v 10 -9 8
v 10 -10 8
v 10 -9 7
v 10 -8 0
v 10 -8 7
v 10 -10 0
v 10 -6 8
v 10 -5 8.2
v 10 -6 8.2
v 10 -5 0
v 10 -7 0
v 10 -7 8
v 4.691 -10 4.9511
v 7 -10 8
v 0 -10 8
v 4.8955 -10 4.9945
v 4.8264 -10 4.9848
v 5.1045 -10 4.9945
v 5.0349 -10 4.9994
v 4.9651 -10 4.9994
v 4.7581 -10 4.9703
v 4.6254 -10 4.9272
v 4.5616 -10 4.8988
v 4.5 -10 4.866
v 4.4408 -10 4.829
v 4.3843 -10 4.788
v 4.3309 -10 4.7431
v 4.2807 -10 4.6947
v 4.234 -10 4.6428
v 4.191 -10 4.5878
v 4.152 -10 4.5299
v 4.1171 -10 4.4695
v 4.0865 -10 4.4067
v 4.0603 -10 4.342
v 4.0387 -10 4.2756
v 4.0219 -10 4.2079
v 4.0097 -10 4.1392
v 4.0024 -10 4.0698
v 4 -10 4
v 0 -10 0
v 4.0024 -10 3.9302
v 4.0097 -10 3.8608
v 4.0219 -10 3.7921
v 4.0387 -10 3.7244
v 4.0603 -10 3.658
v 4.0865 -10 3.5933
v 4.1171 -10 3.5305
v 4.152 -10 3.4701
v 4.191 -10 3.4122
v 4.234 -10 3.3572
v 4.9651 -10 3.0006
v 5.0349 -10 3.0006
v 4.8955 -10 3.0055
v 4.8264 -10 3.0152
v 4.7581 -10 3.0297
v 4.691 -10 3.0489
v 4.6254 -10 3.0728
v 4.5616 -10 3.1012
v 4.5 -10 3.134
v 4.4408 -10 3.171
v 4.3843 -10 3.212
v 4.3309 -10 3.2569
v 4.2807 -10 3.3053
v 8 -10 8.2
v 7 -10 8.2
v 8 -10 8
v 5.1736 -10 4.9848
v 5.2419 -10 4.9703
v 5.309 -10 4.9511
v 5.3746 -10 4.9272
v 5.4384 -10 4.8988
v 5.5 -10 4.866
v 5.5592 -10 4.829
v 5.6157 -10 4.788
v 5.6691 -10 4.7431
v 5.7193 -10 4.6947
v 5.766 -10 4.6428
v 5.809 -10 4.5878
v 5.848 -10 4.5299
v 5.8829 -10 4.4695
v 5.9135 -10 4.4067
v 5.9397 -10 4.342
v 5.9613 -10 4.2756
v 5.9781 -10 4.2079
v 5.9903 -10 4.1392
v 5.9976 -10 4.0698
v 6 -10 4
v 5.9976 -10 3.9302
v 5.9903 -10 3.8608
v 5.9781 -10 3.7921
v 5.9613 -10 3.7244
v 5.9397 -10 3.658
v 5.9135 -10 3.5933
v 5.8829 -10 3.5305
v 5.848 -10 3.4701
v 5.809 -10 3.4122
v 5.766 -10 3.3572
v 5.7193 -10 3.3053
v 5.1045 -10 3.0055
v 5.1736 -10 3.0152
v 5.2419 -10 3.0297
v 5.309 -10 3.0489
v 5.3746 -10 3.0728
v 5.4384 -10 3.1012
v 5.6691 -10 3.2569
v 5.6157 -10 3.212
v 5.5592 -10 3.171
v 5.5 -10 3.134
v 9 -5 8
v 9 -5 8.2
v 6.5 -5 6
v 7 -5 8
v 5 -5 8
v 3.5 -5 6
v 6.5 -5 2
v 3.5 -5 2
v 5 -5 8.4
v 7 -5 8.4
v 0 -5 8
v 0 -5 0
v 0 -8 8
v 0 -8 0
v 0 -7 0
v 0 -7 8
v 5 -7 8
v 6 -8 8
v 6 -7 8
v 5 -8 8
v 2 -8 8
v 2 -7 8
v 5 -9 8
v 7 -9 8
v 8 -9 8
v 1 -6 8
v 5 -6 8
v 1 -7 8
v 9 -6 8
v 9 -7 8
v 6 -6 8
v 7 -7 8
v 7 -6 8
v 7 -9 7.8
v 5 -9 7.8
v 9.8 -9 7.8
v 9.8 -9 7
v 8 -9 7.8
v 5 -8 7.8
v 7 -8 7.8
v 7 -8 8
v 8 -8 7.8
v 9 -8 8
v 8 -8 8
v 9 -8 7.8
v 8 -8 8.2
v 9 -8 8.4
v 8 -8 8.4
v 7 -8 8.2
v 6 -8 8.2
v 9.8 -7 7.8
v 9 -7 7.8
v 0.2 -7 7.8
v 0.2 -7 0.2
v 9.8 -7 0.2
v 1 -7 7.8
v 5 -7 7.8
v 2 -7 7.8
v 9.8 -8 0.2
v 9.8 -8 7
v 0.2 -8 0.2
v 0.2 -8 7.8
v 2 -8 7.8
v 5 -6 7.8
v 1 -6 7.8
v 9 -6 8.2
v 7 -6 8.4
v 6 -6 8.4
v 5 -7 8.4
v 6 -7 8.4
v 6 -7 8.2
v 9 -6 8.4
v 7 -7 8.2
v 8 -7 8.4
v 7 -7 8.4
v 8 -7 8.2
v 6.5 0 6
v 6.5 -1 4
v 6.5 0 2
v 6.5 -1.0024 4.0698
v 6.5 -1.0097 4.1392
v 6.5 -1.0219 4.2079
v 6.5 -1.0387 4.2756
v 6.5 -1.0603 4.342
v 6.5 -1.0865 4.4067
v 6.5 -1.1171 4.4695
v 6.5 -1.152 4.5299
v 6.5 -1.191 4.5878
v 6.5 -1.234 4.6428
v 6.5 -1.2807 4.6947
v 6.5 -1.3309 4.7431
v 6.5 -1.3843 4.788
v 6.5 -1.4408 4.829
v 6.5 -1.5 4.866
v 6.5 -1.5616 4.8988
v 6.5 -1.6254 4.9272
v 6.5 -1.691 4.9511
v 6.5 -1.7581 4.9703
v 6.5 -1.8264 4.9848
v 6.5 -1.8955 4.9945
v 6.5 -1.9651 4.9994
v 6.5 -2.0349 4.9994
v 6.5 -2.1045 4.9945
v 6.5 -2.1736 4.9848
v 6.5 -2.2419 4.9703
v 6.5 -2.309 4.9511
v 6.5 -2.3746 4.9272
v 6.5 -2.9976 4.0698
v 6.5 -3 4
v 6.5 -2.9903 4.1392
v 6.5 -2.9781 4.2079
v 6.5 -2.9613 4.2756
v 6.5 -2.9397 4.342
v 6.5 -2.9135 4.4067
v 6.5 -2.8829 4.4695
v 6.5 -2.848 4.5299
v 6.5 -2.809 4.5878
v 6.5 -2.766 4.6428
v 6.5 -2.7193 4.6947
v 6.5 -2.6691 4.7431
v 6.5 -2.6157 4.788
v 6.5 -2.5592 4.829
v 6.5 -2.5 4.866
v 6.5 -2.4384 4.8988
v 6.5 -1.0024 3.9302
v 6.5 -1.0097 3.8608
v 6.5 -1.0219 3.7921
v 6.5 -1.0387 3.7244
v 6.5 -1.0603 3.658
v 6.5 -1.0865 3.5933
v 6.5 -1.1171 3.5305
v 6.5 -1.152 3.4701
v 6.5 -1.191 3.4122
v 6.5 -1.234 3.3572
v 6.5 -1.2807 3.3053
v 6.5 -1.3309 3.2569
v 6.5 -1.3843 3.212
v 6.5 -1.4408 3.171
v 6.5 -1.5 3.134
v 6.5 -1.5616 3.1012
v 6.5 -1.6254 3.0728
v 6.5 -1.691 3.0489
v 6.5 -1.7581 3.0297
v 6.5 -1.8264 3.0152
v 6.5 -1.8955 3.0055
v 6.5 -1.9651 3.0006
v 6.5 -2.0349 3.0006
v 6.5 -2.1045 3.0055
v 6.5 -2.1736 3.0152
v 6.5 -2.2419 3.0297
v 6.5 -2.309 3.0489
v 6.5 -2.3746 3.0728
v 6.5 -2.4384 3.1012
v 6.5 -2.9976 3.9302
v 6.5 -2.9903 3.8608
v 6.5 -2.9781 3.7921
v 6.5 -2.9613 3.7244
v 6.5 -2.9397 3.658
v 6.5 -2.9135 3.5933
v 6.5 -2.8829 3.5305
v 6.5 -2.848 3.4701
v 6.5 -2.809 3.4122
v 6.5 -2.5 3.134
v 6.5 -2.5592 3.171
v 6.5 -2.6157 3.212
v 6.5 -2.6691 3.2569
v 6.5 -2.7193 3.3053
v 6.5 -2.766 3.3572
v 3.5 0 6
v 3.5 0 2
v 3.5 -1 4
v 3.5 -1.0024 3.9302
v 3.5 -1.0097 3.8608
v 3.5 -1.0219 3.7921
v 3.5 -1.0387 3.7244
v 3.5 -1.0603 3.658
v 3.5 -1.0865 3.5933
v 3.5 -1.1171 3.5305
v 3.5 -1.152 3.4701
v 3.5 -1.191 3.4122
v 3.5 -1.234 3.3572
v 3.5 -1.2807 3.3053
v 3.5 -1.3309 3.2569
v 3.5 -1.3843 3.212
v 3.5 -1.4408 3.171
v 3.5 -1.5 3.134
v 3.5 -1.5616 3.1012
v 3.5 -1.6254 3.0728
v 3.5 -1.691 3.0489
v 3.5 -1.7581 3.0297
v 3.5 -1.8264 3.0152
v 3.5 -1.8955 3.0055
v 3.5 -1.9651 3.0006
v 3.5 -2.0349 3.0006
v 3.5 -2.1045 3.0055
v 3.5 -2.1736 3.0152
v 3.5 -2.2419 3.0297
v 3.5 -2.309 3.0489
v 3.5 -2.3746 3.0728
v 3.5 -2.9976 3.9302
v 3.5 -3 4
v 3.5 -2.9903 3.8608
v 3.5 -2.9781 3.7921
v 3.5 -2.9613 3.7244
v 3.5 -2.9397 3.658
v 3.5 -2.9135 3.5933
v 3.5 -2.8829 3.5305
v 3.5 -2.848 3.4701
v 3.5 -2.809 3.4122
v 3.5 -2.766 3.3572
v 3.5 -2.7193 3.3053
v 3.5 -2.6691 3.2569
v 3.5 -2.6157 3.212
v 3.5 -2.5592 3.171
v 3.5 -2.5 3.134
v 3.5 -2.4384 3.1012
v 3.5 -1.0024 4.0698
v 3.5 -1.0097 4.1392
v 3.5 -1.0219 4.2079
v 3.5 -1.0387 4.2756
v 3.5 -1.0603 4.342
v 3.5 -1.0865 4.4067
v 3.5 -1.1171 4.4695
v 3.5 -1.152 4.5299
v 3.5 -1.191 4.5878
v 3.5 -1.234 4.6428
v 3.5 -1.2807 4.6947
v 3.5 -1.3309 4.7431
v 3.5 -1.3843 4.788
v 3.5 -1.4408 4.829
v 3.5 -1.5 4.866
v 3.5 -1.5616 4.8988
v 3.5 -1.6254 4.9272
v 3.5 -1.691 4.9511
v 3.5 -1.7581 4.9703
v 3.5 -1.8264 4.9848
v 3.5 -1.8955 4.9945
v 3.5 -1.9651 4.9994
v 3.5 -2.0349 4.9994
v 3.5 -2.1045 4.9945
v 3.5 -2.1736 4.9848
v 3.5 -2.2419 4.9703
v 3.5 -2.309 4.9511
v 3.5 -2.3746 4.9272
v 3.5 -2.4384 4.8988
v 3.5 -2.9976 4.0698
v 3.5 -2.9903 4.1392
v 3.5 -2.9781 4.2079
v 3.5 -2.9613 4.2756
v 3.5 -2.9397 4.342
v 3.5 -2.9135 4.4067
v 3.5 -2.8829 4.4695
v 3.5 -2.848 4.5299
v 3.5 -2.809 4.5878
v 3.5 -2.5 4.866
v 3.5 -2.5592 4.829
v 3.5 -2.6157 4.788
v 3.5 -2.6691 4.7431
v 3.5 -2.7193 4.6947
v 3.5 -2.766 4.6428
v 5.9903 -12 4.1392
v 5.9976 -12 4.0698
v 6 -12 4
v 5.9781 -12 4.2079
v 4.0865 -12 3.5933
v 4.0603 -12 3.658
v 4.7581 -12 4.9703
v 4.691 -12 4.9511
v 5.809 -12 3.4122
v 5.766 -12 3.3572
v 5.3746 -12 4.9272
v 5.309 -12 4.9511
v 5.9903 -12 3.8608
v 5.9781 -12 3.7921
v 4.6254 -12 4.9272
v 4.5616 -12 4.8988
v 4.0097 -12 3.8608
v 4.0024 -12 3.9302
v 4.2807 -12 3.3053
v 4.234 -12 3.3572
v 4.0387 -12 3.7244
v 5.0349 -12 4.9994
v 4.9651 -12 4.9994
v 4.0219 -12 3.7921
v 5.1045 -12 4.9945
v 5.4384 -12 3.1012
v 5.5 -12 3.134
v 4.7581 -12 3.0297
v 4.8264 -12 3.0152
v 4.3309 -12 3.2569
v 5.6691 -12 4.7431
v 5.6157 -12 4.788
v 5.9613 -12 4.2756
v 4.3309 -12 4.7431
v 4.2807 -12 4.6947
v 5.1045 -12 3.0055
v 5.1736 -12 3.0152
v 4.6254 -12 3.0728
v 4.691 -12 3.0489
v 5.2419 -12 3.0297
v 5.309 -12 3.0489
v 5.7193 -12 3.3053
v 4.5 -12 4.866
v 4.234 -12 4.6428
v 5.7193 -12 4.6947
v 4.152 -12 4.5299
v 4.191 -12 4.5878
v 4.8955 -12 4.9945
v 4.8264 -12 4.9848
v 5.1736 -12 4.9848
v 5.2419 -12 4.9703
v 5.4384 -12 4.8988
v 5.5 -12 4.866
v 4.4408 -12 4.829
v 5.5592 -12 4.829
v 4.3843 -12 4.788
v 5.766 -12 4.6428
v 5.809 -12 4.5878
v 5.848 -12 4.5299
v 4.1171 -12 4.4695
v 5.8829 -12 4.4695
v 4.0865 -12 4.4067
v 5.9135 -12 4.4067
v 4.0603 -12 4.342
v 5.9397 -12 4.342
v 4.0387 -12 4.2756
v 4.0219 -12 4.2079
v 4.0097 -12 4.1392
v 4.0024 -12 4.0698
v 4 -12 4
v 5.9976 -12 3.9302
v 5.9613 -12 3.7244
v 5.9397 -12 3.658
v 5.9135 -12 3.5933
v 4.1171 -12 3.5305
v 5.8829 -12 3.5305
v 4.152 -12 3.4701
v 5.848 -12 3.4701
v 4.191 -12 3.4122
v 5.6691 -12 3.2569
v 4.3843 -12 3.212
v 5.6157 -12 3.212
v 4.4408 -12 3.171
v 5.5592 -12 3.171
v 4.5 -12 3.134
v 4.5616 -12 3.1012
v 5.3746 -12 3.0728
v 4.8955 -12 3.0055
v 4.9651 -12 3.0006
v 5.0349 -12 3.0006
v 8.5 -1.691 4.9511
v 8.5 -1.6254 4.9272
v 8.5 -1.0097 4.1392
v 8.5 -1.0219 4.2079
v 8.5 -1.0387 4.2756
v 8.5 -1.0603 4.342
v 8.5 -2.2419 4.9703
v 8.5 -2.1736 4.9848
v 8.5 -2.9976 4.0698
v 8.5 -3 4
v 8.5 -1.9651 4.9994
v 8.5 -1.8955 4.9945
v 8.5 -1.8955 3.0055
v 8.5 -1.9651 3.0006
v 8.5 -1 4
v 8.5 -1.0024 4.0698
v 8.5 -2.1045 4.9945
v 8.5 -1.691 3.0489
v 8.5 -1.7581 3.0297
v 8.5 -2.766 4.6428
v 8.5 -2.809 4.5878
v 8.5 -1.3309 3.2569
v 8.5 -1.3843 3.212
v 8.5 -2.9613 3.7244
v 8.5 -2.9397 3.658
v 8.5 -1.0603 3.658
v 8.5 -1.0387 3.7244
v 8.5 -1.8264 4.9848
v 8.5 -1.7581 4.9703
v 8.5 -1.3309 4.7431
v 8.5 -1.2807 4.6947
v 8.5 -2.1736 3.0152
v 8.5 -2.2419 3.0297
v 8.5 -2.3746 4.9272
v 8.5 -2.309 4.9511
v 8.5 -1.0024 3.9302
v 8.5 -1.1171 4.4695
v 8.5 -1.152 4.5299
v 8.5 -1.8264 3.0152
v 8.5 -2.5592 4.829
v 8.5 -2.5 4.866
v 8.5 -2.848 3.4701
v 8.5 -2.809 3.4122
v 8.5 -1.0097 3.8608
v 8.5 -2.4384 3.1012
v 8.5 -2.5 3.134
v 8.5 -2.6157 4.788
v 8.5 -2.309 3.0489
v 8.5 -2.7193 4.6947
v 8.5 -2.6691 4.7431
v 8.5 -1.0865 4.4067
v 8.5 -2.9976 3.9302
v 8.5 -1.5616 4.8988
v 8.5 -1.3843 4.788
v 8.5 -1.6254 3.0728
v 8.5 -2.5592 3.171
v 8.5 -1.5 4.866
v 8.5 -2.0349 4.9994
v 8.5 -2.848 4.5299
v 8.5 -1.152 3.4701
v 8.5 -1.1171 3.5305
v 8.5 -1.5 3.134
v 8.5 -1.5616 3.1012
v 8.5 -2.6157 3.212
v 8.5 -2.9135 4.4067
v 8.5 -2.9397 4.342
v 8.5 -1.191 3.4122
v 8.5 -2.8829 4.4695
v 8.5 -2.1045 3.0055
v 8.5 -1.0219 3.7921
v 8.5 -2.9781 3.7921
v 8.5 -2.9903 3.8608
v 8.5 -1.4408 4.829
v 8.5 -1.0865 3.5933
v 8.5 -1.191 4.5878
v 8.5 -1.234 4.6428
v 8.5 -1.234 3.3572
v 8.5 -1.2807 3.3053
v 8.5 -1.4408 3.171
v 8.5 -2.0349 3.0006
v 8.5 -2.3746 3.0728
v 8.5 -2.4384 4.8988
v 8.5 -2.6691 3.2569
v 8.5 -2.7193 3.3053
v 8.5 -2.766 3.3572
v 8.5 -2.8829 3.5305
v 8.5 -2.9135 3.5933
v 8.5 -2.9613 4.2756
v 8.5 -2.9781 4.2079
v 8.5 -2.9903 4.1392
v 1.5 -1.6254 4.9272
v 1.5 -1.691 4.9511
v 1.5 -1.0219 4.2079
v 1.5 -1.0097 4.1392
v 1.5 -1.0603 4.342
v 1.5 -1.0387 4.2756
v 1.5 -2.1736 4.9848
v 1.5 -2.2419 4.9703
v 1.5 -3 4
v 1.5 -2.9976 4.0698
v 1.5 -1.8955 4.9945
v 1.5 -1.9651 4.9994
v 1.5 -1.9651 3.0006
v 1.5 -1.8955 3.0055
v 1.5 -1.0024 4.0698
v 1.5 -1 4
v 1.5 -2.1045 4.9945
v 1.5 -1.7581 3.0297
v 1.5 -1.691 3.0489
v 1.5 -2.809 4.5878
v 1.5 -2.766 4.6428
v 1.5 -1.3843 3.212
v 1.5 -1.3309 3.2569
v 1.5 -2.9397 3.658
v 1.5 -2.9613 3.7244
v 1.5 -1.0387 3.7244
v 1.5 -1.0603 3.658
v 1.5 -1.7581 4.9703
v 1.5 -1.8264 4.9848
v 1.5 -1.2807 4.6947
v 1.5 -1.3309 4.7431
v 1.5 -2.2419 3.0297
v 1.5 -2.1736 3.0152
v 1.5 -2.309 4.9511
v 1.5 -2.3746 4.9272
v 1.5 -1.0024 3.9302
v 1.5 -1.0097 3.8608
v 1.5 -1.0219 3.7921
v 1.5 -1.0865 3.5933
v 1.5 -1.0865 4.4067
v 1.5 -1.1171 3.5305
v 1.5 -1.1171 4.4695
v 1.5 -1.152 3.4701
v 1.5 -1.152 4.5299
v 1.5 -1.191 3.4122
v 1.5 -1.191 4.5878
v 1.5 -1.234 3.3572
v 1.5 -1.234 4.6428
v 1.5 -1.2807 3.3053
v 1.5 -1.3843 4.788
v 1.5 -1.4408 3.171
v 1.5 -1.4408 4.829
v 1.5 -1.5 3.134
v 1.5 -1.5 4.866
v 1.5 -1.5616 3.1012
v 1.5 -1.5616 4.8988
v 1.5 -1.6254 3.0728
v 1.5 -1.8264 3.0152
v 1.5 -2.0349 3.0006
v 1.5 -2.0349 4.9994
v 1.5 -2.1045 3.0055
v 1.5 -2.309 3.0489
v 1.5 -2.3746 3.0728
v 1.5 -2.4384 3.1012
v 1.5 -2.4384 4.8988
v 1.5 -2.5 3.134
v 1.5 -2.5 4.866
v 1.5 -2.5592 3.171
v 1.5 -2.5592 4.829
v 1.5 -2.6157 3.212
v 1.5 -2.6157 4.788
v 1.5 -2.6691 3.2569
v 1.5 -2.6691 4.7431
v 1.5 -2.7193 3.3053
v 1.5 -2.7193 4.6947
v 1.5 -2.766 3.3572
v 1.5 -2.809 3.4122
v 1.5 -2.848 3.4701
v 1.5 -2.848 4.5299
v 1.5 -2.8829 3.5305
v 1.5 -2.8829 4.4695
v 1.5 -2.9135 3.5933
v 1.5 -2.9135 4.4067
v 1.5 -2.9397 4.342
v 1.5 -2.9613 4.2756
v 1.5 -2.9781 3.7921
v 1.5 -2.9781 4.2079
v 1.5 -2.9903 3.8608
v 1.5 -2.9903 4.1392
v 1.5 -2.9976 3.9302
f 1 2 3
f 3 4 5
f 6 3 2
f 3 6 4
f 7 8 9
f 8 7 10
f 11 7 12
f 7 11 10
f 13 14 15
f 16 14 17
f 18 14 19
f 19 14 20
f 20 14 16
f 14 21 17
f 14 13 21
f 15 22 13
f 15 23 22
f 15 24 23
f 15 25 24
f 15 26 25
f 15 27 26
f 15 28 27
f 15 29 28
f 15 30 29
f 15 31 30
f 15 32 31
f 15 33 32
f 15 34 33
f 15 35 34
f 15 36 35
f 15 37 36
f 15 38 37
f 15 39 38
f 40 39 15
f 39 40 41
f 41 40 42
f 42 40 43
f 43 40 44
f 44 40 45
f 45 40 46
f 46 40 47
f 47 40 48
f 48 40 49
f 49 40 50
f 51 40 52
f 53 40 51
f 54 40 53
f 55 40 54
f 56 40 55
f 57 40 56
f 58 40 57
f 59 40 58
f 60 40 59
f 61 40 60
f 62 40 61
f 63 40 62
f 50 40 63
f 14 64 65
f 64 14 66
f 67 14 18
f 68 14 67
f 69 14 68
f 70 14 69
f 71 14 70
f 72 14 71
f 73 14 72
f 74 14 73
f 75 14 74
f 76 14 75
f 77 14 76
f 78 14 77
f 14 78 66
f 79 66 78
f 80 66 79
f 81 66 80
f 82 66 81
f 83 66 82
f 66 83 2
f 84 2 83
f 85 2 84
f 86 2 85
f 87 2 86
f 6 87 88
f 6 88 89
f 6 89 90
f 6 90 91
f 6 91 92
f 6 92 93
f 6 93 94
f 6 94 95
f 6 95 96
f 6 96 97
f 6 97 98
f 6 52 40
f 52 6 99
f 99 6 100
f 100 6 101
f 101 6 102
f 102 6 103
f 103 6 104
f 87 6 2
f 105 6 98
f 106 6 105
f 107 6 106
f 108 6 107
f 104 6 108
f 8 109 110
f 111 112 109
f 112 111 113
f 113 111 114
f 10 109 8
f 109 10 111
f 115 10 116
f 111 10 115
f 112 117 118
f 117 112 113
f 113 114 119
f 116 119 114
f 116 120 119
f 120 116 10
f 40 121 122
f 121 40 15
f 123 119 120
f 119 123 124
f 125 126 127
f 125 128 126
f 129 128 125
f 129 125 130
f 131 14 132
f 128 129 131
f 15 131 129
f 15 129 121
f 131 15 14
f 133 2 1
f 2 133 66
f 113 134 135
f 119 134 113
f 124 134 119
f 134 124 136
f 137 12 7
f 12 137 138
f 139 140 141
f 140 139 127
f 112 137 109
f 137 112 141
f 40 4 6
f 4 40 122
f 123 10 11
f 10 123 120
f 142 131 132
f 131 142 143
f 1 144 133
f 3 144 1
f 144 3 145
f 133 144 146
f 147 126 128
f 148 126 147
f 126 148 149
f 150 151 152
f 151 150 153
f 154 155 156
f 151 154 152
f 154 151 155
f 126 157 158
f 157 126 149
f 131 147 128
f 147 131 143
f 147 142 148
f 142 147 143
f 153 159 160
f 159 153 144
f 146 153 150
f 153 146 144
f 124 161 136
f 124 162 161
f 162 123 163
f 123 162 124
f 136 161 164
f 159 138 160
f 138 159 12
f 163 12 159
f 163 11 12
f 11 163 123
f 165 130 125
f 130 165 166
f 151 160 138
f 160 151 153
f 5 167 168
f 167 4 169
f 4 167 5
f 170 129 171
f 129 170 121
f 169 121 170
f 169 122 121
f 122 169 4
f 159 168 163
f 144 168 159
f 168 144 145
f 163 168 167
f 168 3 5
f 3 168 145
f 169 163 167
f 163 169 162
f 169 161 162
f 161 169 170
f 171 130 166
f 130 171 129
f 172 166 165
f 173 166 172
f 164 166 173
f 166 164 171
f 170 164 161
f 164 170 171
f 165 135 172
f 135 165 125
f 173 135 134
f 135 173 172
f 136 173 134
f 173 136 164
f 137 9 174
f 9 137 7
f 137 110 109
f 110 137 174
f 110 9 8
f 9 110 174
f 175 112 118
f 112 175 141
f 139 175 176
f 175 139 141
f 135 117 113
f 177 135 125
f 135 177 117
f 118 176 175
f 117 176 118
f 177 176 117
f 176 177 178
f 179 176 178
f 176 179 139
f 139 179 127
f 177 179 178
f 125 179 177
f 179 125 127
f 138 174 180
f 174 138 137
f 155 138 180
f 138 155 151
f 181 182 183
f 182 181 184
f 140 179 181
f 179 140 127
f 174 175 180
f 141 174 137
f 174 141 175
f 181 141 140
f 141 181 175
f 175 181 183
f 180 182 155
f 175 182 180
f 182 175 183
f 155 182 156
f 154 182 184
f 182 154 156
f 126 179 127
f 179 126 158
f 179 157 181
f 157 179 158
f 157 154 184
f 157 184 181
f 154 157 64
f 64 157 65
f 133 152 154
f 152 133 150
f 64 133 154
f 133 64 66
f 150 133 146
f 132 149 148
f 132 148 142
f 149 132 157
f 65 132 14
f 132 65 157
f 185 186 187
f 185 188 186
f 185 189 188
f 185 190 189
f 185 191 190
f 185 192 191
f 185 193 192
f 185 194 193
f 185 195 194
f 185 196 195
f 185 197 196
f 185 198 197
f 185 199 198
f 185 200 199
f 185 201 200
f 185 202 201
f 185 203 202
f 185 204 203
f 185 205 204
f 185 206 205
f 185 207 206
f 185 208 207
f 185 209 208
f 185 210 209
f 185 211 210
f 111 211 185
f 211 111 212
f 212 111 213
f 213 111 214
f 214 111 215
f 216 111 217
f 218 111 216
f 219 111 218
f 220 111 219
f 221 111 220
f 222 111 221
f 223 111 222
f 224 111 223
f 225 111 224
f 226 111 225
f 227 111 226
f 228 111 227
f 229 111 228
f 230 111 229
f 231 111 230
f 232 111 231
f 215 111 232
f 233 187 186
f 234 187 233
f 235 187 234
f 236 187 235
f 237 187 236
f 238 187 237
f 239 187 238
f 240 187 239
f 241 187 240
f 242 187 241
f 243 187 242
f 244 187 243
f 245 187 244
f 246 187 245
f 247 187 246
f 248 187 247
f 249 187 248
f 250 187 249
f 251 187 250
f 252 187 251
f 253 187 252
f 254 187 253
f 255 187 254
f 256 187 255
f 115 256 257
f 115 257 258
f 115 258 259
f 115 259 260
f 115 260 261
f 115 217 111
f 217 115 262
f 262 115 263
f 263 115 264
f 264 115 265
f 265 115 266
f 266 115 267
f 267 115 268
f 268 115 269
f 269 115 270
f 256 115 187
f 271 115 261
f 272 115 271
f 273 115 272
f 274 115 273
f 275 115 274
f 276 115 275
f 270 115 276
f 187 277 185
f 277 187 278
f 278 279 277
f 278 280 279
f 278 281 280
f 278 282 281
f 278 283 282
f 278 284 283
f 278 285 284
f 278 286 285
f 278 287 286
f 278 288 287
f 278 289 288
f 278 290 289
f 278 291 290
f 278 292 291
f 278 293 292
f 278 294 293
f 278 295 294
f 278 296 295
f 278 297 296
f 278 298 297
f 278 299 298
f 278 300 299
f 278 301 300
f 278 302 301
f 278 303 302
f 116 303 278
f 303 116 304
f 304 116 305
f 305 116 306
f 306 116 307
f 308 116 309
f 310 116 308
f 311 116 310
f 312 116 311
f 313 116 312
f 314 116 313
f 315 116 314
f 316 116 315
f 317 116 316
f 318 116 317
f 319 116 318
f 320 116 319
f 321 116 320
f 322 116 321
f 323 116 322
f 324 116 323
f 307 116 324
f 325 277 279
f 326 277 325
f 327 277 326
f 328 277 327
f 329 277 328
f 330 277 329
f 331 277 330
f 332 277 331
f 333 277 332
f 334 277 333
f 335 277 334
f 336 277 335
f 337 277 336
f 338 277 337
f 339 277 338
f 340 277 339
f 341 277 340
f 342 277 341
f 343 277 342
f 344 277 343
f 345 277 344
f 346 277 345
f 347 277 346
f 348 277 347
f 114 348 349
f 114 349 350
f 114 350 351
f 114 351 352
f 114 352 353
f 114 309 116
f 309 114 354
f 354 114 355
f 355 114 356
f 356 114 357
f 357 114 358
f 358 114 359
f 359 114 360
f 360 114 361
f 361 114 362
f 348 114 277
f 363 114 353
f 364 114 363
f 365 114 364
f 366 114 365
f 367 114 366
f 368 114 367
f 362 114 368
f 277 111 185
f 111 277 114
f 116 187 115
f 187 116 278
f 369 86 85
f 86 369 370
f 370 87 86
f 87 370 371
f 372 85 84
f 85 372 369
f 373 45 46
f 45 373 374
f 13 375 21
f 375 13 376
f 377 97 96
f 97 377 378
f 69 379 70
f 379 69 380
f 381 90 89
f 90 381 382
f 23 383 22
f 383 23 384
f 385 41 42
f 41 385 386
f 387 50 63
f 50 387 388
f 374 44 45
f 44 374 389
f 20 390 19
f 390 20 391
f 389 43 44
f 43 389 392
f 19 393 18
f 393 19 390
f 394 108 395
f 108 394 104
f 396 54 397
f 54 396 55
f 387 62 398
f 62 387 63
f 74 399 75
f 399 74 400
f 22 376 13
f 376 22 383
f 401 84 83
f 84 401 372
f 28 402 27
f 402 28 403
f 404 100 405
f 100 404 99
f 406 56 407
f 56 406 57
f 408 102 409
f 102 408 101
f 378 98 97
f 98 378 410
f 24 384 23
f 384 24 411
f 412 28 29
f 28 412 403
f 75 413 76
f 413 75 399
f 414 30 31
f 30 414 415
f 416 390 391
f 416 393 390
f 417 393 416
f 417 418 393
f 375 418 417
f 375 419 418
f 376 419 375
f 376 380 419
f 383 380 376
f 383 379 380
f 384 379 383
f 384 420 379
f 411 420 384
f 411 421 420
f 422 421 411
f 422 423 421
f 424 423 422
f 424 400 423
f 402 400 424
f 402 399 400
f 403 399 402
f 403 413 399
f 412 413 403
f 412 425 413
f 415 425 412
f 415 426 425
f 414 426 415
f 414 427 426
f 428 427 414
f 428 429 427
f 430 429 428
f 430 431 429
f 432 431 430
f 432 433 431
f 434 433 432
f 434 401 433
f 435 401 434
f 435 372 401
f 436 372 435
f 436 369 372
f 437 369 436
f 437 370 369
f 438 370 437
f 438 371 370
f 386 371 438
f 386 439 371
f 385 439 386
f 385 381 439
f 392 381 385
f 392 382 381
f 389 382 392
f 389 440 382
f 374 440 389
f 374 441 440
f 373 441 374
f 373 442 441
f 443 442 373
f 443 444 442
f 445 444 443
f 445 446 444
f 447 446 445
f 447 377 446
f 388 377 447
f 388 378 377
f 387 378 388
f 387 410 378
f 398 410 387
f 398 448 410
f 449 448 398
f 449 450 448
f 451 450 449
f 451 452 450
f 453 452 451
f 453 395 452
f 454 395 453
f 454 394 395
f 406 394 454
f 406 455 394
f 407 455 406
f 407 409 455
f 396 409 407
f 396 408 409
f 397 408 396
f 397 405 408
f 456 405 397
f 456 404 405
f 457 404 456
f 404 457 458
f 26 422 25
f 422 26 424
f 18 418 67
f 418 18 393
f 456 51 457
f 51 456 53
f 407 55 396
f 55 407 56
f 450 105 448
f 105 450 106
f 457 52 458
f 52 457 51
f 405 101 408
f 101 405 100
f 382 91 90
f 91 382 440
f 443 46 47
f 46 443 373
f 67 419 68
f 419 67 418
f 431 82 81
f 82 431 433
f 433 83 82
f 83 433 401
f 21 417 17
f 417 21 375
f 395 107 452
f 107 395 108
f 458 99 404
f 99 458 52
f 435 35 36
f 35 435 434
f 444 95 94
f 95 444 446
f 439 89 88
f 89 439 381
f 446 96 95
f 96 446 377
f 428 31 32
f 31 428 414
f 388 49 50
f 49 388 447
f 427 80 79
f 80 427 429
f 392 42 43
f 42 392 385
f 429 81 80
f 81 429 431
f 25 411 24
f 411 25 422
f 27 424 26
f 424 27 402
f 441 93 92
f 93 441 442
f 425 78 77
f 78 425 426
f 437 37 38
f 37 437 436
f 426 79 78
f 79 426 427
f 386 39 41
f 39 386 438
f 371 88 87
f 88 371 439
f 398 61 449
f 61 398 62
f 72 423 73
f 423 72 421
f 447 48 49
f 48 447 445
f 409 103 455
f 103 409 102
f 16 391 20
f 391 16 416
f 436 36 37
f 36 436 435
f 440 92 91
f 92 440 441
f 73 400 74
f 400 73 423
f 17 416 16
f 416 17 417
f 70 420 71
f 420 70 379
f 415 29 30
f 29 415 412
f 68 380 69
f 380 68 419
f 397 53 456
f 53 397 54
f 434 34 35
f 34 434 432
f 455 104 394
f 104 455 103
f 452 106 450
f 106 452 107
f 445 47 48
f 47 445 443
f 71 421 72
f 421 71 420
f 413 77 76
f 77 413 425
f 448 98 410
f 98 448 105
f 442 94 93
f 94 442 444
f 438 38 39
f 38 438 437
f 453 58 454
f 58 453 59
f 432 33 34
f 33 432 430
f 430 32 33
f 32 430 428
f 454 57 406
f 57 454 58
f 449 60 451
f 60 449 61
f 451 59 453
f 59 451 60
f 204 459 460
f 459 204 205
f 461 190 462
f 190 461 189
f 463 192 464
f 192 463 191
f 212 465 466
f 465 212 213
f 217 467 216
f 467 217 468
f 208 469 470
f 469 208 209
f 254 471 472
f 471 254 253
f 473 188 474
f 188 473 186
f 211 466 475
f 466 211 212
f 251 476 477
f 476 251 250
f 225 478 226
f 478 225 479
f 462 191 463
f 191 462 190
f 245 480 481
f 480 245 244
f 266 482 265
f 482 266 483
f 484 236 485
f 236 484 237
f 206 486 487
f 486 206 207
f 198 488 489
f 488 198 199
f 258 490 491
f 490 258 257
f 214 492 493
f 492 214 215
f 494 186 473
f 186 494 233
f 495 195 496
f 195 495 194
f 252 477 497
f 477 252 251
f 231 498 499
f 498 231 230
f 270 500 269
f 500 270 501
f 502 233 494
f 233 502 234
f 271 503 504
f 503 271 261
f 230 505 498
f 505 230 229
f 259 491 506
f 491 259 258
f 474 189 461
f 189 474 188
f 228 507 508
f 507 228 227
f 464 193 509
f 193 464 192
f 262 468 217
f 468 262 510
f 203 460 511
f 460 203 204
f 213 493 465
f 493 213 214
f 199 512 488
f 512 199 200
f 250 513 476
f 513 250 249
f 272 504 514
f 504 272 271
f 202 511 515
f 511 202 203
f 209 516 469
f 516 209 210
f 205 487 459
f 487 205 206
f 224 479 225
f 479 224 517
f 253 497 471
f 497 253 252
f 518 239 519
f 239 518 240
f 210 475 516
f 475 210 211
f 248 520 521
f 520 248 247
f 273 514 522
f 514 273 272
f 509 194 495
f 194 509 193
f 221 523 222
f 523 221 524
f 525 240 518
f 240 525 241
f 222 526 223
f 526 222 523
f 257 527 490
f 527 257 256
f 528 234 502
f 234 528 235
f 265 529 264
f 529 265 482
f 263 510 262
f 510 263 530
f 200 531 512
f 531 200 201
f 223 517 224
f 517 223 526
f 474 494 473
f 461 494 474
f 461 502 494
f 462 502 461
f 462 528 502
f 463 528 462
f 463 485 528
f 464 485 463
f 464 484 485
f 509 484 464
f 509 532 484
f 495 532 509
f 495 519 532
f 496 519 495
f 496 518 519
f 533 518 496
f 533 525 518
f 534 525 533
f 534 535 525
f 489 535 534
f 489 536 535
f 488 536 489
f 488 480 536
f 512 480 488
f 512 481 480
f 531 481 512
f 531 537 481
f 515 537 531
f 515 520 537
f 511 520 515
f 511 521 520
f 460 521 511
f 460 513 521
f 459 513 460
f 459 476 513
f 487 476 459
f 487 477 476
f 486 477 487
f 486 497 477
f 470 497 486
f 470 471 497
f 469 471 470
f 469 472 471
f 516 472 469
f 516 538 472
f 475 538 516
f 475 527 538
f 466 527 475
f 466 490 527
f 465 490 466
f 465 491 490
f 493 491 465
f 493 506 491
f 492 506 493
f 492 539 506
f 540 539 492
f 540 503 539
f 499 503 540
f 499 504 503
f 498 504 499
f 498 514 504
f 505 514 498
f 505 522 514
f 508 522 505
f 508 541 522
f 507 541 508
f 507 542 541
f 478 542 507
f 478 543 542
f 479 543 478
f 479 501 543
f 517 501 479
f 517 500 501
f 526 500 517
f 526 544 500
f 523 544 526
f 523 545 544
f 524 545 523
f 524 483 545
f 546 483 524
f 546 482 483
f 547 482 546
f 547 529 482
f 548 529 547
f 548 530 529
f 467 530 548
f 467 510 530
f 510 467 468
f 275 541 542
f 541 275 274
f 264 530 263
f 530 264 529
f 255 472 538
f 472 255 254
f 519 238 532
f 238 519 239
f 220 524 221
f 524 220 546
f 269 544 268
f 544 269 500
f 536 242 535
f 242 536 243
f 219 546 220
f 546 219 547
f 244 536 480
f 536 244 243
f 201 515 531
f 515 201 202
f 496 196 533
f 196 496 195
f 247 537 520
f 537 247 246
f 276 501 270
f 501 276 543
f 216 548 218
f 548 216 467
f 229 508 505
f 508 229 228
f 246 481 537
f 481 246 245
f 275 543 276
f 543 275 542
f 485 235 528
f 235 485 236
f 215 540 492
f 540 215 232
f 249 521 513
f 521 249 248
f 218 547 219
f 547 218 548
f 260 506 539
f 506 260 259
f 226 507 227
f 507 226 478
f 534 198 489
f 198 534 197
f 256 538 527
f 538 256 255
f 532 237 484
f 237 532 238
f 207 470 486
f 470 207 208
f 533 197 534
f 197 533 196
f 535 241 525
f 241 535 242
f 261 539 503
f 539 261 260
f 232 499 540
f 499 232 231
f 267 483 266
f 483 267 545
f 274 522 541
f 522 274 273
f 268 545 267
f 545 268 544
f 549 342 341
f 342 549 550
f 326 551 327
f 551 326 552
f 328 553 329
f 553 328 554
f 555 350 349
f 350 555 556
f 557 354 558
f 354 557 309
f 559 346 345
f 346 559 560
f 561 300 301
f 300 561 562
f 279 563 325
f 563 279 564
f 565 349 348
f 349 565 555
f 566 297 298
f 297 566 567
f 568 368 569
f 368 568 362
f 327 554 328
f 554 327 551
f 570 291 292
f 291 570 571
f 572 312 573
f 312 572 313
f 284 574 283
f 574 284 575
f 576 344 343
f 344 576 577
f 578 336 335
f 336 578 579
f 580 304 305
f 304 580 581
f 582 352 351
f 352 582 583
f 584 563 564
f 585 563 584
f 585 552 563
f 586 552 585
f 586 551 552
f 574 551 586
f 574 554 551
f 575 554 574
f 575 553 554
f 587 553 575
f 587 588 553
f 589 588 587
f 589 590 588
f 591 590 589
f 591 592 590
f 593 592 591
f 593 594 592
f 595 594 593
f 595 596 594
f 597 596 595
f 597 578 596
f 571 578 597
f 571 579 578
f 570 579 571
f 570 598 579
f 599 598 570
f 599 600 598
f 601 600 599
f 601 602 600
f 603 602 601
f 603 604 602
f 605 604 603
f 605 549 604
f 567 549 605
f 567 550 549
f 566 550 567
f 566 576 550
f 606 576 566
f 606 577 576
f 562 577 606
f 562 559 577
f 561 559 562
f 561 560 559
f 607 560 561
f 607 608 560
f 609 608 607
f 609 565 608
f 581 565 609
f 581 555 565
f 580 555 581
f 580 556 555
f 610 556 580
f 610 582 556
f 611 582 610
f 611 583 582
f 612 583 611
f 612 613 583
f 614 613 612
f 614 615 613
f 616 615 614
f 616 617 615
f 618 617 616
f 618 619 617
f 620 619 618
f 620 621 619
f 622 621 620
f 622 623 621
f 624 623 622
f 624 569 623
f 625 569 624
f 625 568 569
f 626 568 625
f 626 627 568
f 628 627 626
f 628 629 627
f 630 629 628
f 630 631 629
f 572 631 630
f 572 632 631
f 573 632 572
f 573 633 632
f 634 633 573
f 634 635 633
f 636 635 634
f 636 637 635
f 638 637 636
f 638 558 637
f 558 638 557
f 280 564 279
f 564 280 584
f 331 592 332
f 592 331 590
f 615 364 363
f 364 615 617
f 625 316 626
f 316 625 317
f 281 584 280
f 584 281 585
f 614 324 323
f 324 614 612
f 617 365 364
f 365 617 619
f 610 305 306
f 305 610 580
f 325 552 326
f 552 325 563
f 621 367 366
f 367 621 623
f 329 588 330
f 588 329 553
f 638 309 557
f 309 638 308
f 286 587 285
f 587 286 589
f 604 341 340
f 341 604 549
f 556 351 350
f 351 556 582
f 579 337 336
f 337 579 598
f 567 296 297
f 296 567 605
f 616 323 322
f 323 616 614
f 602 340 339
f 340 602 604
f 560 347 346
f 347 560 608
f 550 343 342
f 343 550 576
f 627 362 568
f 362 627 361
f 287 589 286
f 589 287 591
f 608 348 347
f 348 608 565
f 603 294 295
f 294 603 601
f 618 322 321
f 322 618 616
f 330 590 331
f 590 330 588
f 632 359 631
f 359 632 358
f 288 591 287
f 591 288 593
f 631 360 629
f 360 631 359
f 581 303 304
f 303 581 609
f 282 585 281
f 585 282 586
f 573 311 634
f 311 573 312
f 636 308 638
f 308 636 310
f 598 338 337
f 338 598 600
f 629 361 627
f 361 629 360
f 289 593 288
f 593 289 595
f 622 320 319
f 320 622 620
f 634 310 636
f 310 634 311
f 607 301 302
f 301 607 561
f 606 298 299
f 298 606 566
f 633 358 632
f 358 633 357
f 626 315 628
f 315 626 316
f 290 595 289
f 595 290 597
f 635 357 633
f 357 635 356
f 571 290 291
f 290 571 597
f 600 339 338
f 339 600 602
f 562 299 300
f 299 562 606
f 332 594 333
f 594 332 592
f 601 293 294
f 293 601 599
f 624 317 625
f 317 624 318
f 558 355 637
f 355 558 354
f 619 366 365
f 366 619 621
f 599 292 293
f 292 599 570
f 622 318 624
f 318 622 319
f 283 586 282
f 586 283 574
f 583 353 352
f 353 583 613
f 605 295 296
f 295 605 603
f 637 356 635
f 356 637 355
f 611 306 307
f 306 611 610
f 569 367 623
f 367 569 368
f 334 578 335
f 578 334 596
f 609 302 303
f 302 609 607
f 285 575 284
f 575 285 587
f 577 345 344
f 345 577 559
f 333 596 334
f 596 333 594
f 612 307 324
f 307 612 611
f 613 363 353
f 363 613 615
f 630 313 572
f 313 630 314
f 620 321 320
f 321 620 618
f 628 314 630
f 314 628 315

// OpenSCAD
//waist

$fn=90;

rotate([90,0,0]){

difference(){

translate([0,0,5]){
color("darkgrey"){
cube([10,8,5]);
}
}

translate([5,7.8,8]){
color("tan"){
cube([5,1,1]);
}
}

translate([9,7.8,7]){
color("tan"){
cube([1,1,1]);
}
}

translate([9.8,0,7]){
color("tan"){
cube([1,8,1]);
}
}

translate([9.8,7,8]){
color("tan"){
cube([1,1,1]);
}
}

translate([0,-0.8,7]){
color("tan"){
cube([10,1,1]);
}
}

translate([-0.8,0,7]){
color("tan"){
cube([1,8,1]);
}
}

translate([0,7.8,7]){
color("tan"){
cube([2,1,1]);
}
}

translate([1,7.8,6]){
color("tan"){
cube([4,1,1]);
}
}

} //end of diff

//vines

translate([9,8,5]){
color("darkgreen"){
cube([1,0.2,1]);
}
}

translate([5,8,5]){
color("green"){
cube([2,0.4,1]);
}
}

translate([5,8,6]){
color("green"){
cube([1,0.4,1]);
}
}

translate([7,8,6]){
color("green"){
cube([2,0.4,1]);
}
}

translate([8,8,7]){
color("green"){
cube([1,0.4,1]);
}
}

translate([6,8,7]){
color("darkgreen"){
cube([2,0.2,1]);
}
}

translate([7,7.2,8]){
color("darkgreen"){
cube([1,1,2]);
}
}

translate([3.5,2,0]){
color("darkgrey"){
cube([3,4,5]);
}
}

//conectors

translate([5,4,9]){
cylinder(r=1,h=3);
}

translate([6.5,4,2]){
rotate([0,90,0]){
cylinder(r1=1,h=2);
}      
}    
    
translate([1.5,4,2]){
rotate([0,90,0]){
cylinder(r1=1,h=2);
}      
}   

}
